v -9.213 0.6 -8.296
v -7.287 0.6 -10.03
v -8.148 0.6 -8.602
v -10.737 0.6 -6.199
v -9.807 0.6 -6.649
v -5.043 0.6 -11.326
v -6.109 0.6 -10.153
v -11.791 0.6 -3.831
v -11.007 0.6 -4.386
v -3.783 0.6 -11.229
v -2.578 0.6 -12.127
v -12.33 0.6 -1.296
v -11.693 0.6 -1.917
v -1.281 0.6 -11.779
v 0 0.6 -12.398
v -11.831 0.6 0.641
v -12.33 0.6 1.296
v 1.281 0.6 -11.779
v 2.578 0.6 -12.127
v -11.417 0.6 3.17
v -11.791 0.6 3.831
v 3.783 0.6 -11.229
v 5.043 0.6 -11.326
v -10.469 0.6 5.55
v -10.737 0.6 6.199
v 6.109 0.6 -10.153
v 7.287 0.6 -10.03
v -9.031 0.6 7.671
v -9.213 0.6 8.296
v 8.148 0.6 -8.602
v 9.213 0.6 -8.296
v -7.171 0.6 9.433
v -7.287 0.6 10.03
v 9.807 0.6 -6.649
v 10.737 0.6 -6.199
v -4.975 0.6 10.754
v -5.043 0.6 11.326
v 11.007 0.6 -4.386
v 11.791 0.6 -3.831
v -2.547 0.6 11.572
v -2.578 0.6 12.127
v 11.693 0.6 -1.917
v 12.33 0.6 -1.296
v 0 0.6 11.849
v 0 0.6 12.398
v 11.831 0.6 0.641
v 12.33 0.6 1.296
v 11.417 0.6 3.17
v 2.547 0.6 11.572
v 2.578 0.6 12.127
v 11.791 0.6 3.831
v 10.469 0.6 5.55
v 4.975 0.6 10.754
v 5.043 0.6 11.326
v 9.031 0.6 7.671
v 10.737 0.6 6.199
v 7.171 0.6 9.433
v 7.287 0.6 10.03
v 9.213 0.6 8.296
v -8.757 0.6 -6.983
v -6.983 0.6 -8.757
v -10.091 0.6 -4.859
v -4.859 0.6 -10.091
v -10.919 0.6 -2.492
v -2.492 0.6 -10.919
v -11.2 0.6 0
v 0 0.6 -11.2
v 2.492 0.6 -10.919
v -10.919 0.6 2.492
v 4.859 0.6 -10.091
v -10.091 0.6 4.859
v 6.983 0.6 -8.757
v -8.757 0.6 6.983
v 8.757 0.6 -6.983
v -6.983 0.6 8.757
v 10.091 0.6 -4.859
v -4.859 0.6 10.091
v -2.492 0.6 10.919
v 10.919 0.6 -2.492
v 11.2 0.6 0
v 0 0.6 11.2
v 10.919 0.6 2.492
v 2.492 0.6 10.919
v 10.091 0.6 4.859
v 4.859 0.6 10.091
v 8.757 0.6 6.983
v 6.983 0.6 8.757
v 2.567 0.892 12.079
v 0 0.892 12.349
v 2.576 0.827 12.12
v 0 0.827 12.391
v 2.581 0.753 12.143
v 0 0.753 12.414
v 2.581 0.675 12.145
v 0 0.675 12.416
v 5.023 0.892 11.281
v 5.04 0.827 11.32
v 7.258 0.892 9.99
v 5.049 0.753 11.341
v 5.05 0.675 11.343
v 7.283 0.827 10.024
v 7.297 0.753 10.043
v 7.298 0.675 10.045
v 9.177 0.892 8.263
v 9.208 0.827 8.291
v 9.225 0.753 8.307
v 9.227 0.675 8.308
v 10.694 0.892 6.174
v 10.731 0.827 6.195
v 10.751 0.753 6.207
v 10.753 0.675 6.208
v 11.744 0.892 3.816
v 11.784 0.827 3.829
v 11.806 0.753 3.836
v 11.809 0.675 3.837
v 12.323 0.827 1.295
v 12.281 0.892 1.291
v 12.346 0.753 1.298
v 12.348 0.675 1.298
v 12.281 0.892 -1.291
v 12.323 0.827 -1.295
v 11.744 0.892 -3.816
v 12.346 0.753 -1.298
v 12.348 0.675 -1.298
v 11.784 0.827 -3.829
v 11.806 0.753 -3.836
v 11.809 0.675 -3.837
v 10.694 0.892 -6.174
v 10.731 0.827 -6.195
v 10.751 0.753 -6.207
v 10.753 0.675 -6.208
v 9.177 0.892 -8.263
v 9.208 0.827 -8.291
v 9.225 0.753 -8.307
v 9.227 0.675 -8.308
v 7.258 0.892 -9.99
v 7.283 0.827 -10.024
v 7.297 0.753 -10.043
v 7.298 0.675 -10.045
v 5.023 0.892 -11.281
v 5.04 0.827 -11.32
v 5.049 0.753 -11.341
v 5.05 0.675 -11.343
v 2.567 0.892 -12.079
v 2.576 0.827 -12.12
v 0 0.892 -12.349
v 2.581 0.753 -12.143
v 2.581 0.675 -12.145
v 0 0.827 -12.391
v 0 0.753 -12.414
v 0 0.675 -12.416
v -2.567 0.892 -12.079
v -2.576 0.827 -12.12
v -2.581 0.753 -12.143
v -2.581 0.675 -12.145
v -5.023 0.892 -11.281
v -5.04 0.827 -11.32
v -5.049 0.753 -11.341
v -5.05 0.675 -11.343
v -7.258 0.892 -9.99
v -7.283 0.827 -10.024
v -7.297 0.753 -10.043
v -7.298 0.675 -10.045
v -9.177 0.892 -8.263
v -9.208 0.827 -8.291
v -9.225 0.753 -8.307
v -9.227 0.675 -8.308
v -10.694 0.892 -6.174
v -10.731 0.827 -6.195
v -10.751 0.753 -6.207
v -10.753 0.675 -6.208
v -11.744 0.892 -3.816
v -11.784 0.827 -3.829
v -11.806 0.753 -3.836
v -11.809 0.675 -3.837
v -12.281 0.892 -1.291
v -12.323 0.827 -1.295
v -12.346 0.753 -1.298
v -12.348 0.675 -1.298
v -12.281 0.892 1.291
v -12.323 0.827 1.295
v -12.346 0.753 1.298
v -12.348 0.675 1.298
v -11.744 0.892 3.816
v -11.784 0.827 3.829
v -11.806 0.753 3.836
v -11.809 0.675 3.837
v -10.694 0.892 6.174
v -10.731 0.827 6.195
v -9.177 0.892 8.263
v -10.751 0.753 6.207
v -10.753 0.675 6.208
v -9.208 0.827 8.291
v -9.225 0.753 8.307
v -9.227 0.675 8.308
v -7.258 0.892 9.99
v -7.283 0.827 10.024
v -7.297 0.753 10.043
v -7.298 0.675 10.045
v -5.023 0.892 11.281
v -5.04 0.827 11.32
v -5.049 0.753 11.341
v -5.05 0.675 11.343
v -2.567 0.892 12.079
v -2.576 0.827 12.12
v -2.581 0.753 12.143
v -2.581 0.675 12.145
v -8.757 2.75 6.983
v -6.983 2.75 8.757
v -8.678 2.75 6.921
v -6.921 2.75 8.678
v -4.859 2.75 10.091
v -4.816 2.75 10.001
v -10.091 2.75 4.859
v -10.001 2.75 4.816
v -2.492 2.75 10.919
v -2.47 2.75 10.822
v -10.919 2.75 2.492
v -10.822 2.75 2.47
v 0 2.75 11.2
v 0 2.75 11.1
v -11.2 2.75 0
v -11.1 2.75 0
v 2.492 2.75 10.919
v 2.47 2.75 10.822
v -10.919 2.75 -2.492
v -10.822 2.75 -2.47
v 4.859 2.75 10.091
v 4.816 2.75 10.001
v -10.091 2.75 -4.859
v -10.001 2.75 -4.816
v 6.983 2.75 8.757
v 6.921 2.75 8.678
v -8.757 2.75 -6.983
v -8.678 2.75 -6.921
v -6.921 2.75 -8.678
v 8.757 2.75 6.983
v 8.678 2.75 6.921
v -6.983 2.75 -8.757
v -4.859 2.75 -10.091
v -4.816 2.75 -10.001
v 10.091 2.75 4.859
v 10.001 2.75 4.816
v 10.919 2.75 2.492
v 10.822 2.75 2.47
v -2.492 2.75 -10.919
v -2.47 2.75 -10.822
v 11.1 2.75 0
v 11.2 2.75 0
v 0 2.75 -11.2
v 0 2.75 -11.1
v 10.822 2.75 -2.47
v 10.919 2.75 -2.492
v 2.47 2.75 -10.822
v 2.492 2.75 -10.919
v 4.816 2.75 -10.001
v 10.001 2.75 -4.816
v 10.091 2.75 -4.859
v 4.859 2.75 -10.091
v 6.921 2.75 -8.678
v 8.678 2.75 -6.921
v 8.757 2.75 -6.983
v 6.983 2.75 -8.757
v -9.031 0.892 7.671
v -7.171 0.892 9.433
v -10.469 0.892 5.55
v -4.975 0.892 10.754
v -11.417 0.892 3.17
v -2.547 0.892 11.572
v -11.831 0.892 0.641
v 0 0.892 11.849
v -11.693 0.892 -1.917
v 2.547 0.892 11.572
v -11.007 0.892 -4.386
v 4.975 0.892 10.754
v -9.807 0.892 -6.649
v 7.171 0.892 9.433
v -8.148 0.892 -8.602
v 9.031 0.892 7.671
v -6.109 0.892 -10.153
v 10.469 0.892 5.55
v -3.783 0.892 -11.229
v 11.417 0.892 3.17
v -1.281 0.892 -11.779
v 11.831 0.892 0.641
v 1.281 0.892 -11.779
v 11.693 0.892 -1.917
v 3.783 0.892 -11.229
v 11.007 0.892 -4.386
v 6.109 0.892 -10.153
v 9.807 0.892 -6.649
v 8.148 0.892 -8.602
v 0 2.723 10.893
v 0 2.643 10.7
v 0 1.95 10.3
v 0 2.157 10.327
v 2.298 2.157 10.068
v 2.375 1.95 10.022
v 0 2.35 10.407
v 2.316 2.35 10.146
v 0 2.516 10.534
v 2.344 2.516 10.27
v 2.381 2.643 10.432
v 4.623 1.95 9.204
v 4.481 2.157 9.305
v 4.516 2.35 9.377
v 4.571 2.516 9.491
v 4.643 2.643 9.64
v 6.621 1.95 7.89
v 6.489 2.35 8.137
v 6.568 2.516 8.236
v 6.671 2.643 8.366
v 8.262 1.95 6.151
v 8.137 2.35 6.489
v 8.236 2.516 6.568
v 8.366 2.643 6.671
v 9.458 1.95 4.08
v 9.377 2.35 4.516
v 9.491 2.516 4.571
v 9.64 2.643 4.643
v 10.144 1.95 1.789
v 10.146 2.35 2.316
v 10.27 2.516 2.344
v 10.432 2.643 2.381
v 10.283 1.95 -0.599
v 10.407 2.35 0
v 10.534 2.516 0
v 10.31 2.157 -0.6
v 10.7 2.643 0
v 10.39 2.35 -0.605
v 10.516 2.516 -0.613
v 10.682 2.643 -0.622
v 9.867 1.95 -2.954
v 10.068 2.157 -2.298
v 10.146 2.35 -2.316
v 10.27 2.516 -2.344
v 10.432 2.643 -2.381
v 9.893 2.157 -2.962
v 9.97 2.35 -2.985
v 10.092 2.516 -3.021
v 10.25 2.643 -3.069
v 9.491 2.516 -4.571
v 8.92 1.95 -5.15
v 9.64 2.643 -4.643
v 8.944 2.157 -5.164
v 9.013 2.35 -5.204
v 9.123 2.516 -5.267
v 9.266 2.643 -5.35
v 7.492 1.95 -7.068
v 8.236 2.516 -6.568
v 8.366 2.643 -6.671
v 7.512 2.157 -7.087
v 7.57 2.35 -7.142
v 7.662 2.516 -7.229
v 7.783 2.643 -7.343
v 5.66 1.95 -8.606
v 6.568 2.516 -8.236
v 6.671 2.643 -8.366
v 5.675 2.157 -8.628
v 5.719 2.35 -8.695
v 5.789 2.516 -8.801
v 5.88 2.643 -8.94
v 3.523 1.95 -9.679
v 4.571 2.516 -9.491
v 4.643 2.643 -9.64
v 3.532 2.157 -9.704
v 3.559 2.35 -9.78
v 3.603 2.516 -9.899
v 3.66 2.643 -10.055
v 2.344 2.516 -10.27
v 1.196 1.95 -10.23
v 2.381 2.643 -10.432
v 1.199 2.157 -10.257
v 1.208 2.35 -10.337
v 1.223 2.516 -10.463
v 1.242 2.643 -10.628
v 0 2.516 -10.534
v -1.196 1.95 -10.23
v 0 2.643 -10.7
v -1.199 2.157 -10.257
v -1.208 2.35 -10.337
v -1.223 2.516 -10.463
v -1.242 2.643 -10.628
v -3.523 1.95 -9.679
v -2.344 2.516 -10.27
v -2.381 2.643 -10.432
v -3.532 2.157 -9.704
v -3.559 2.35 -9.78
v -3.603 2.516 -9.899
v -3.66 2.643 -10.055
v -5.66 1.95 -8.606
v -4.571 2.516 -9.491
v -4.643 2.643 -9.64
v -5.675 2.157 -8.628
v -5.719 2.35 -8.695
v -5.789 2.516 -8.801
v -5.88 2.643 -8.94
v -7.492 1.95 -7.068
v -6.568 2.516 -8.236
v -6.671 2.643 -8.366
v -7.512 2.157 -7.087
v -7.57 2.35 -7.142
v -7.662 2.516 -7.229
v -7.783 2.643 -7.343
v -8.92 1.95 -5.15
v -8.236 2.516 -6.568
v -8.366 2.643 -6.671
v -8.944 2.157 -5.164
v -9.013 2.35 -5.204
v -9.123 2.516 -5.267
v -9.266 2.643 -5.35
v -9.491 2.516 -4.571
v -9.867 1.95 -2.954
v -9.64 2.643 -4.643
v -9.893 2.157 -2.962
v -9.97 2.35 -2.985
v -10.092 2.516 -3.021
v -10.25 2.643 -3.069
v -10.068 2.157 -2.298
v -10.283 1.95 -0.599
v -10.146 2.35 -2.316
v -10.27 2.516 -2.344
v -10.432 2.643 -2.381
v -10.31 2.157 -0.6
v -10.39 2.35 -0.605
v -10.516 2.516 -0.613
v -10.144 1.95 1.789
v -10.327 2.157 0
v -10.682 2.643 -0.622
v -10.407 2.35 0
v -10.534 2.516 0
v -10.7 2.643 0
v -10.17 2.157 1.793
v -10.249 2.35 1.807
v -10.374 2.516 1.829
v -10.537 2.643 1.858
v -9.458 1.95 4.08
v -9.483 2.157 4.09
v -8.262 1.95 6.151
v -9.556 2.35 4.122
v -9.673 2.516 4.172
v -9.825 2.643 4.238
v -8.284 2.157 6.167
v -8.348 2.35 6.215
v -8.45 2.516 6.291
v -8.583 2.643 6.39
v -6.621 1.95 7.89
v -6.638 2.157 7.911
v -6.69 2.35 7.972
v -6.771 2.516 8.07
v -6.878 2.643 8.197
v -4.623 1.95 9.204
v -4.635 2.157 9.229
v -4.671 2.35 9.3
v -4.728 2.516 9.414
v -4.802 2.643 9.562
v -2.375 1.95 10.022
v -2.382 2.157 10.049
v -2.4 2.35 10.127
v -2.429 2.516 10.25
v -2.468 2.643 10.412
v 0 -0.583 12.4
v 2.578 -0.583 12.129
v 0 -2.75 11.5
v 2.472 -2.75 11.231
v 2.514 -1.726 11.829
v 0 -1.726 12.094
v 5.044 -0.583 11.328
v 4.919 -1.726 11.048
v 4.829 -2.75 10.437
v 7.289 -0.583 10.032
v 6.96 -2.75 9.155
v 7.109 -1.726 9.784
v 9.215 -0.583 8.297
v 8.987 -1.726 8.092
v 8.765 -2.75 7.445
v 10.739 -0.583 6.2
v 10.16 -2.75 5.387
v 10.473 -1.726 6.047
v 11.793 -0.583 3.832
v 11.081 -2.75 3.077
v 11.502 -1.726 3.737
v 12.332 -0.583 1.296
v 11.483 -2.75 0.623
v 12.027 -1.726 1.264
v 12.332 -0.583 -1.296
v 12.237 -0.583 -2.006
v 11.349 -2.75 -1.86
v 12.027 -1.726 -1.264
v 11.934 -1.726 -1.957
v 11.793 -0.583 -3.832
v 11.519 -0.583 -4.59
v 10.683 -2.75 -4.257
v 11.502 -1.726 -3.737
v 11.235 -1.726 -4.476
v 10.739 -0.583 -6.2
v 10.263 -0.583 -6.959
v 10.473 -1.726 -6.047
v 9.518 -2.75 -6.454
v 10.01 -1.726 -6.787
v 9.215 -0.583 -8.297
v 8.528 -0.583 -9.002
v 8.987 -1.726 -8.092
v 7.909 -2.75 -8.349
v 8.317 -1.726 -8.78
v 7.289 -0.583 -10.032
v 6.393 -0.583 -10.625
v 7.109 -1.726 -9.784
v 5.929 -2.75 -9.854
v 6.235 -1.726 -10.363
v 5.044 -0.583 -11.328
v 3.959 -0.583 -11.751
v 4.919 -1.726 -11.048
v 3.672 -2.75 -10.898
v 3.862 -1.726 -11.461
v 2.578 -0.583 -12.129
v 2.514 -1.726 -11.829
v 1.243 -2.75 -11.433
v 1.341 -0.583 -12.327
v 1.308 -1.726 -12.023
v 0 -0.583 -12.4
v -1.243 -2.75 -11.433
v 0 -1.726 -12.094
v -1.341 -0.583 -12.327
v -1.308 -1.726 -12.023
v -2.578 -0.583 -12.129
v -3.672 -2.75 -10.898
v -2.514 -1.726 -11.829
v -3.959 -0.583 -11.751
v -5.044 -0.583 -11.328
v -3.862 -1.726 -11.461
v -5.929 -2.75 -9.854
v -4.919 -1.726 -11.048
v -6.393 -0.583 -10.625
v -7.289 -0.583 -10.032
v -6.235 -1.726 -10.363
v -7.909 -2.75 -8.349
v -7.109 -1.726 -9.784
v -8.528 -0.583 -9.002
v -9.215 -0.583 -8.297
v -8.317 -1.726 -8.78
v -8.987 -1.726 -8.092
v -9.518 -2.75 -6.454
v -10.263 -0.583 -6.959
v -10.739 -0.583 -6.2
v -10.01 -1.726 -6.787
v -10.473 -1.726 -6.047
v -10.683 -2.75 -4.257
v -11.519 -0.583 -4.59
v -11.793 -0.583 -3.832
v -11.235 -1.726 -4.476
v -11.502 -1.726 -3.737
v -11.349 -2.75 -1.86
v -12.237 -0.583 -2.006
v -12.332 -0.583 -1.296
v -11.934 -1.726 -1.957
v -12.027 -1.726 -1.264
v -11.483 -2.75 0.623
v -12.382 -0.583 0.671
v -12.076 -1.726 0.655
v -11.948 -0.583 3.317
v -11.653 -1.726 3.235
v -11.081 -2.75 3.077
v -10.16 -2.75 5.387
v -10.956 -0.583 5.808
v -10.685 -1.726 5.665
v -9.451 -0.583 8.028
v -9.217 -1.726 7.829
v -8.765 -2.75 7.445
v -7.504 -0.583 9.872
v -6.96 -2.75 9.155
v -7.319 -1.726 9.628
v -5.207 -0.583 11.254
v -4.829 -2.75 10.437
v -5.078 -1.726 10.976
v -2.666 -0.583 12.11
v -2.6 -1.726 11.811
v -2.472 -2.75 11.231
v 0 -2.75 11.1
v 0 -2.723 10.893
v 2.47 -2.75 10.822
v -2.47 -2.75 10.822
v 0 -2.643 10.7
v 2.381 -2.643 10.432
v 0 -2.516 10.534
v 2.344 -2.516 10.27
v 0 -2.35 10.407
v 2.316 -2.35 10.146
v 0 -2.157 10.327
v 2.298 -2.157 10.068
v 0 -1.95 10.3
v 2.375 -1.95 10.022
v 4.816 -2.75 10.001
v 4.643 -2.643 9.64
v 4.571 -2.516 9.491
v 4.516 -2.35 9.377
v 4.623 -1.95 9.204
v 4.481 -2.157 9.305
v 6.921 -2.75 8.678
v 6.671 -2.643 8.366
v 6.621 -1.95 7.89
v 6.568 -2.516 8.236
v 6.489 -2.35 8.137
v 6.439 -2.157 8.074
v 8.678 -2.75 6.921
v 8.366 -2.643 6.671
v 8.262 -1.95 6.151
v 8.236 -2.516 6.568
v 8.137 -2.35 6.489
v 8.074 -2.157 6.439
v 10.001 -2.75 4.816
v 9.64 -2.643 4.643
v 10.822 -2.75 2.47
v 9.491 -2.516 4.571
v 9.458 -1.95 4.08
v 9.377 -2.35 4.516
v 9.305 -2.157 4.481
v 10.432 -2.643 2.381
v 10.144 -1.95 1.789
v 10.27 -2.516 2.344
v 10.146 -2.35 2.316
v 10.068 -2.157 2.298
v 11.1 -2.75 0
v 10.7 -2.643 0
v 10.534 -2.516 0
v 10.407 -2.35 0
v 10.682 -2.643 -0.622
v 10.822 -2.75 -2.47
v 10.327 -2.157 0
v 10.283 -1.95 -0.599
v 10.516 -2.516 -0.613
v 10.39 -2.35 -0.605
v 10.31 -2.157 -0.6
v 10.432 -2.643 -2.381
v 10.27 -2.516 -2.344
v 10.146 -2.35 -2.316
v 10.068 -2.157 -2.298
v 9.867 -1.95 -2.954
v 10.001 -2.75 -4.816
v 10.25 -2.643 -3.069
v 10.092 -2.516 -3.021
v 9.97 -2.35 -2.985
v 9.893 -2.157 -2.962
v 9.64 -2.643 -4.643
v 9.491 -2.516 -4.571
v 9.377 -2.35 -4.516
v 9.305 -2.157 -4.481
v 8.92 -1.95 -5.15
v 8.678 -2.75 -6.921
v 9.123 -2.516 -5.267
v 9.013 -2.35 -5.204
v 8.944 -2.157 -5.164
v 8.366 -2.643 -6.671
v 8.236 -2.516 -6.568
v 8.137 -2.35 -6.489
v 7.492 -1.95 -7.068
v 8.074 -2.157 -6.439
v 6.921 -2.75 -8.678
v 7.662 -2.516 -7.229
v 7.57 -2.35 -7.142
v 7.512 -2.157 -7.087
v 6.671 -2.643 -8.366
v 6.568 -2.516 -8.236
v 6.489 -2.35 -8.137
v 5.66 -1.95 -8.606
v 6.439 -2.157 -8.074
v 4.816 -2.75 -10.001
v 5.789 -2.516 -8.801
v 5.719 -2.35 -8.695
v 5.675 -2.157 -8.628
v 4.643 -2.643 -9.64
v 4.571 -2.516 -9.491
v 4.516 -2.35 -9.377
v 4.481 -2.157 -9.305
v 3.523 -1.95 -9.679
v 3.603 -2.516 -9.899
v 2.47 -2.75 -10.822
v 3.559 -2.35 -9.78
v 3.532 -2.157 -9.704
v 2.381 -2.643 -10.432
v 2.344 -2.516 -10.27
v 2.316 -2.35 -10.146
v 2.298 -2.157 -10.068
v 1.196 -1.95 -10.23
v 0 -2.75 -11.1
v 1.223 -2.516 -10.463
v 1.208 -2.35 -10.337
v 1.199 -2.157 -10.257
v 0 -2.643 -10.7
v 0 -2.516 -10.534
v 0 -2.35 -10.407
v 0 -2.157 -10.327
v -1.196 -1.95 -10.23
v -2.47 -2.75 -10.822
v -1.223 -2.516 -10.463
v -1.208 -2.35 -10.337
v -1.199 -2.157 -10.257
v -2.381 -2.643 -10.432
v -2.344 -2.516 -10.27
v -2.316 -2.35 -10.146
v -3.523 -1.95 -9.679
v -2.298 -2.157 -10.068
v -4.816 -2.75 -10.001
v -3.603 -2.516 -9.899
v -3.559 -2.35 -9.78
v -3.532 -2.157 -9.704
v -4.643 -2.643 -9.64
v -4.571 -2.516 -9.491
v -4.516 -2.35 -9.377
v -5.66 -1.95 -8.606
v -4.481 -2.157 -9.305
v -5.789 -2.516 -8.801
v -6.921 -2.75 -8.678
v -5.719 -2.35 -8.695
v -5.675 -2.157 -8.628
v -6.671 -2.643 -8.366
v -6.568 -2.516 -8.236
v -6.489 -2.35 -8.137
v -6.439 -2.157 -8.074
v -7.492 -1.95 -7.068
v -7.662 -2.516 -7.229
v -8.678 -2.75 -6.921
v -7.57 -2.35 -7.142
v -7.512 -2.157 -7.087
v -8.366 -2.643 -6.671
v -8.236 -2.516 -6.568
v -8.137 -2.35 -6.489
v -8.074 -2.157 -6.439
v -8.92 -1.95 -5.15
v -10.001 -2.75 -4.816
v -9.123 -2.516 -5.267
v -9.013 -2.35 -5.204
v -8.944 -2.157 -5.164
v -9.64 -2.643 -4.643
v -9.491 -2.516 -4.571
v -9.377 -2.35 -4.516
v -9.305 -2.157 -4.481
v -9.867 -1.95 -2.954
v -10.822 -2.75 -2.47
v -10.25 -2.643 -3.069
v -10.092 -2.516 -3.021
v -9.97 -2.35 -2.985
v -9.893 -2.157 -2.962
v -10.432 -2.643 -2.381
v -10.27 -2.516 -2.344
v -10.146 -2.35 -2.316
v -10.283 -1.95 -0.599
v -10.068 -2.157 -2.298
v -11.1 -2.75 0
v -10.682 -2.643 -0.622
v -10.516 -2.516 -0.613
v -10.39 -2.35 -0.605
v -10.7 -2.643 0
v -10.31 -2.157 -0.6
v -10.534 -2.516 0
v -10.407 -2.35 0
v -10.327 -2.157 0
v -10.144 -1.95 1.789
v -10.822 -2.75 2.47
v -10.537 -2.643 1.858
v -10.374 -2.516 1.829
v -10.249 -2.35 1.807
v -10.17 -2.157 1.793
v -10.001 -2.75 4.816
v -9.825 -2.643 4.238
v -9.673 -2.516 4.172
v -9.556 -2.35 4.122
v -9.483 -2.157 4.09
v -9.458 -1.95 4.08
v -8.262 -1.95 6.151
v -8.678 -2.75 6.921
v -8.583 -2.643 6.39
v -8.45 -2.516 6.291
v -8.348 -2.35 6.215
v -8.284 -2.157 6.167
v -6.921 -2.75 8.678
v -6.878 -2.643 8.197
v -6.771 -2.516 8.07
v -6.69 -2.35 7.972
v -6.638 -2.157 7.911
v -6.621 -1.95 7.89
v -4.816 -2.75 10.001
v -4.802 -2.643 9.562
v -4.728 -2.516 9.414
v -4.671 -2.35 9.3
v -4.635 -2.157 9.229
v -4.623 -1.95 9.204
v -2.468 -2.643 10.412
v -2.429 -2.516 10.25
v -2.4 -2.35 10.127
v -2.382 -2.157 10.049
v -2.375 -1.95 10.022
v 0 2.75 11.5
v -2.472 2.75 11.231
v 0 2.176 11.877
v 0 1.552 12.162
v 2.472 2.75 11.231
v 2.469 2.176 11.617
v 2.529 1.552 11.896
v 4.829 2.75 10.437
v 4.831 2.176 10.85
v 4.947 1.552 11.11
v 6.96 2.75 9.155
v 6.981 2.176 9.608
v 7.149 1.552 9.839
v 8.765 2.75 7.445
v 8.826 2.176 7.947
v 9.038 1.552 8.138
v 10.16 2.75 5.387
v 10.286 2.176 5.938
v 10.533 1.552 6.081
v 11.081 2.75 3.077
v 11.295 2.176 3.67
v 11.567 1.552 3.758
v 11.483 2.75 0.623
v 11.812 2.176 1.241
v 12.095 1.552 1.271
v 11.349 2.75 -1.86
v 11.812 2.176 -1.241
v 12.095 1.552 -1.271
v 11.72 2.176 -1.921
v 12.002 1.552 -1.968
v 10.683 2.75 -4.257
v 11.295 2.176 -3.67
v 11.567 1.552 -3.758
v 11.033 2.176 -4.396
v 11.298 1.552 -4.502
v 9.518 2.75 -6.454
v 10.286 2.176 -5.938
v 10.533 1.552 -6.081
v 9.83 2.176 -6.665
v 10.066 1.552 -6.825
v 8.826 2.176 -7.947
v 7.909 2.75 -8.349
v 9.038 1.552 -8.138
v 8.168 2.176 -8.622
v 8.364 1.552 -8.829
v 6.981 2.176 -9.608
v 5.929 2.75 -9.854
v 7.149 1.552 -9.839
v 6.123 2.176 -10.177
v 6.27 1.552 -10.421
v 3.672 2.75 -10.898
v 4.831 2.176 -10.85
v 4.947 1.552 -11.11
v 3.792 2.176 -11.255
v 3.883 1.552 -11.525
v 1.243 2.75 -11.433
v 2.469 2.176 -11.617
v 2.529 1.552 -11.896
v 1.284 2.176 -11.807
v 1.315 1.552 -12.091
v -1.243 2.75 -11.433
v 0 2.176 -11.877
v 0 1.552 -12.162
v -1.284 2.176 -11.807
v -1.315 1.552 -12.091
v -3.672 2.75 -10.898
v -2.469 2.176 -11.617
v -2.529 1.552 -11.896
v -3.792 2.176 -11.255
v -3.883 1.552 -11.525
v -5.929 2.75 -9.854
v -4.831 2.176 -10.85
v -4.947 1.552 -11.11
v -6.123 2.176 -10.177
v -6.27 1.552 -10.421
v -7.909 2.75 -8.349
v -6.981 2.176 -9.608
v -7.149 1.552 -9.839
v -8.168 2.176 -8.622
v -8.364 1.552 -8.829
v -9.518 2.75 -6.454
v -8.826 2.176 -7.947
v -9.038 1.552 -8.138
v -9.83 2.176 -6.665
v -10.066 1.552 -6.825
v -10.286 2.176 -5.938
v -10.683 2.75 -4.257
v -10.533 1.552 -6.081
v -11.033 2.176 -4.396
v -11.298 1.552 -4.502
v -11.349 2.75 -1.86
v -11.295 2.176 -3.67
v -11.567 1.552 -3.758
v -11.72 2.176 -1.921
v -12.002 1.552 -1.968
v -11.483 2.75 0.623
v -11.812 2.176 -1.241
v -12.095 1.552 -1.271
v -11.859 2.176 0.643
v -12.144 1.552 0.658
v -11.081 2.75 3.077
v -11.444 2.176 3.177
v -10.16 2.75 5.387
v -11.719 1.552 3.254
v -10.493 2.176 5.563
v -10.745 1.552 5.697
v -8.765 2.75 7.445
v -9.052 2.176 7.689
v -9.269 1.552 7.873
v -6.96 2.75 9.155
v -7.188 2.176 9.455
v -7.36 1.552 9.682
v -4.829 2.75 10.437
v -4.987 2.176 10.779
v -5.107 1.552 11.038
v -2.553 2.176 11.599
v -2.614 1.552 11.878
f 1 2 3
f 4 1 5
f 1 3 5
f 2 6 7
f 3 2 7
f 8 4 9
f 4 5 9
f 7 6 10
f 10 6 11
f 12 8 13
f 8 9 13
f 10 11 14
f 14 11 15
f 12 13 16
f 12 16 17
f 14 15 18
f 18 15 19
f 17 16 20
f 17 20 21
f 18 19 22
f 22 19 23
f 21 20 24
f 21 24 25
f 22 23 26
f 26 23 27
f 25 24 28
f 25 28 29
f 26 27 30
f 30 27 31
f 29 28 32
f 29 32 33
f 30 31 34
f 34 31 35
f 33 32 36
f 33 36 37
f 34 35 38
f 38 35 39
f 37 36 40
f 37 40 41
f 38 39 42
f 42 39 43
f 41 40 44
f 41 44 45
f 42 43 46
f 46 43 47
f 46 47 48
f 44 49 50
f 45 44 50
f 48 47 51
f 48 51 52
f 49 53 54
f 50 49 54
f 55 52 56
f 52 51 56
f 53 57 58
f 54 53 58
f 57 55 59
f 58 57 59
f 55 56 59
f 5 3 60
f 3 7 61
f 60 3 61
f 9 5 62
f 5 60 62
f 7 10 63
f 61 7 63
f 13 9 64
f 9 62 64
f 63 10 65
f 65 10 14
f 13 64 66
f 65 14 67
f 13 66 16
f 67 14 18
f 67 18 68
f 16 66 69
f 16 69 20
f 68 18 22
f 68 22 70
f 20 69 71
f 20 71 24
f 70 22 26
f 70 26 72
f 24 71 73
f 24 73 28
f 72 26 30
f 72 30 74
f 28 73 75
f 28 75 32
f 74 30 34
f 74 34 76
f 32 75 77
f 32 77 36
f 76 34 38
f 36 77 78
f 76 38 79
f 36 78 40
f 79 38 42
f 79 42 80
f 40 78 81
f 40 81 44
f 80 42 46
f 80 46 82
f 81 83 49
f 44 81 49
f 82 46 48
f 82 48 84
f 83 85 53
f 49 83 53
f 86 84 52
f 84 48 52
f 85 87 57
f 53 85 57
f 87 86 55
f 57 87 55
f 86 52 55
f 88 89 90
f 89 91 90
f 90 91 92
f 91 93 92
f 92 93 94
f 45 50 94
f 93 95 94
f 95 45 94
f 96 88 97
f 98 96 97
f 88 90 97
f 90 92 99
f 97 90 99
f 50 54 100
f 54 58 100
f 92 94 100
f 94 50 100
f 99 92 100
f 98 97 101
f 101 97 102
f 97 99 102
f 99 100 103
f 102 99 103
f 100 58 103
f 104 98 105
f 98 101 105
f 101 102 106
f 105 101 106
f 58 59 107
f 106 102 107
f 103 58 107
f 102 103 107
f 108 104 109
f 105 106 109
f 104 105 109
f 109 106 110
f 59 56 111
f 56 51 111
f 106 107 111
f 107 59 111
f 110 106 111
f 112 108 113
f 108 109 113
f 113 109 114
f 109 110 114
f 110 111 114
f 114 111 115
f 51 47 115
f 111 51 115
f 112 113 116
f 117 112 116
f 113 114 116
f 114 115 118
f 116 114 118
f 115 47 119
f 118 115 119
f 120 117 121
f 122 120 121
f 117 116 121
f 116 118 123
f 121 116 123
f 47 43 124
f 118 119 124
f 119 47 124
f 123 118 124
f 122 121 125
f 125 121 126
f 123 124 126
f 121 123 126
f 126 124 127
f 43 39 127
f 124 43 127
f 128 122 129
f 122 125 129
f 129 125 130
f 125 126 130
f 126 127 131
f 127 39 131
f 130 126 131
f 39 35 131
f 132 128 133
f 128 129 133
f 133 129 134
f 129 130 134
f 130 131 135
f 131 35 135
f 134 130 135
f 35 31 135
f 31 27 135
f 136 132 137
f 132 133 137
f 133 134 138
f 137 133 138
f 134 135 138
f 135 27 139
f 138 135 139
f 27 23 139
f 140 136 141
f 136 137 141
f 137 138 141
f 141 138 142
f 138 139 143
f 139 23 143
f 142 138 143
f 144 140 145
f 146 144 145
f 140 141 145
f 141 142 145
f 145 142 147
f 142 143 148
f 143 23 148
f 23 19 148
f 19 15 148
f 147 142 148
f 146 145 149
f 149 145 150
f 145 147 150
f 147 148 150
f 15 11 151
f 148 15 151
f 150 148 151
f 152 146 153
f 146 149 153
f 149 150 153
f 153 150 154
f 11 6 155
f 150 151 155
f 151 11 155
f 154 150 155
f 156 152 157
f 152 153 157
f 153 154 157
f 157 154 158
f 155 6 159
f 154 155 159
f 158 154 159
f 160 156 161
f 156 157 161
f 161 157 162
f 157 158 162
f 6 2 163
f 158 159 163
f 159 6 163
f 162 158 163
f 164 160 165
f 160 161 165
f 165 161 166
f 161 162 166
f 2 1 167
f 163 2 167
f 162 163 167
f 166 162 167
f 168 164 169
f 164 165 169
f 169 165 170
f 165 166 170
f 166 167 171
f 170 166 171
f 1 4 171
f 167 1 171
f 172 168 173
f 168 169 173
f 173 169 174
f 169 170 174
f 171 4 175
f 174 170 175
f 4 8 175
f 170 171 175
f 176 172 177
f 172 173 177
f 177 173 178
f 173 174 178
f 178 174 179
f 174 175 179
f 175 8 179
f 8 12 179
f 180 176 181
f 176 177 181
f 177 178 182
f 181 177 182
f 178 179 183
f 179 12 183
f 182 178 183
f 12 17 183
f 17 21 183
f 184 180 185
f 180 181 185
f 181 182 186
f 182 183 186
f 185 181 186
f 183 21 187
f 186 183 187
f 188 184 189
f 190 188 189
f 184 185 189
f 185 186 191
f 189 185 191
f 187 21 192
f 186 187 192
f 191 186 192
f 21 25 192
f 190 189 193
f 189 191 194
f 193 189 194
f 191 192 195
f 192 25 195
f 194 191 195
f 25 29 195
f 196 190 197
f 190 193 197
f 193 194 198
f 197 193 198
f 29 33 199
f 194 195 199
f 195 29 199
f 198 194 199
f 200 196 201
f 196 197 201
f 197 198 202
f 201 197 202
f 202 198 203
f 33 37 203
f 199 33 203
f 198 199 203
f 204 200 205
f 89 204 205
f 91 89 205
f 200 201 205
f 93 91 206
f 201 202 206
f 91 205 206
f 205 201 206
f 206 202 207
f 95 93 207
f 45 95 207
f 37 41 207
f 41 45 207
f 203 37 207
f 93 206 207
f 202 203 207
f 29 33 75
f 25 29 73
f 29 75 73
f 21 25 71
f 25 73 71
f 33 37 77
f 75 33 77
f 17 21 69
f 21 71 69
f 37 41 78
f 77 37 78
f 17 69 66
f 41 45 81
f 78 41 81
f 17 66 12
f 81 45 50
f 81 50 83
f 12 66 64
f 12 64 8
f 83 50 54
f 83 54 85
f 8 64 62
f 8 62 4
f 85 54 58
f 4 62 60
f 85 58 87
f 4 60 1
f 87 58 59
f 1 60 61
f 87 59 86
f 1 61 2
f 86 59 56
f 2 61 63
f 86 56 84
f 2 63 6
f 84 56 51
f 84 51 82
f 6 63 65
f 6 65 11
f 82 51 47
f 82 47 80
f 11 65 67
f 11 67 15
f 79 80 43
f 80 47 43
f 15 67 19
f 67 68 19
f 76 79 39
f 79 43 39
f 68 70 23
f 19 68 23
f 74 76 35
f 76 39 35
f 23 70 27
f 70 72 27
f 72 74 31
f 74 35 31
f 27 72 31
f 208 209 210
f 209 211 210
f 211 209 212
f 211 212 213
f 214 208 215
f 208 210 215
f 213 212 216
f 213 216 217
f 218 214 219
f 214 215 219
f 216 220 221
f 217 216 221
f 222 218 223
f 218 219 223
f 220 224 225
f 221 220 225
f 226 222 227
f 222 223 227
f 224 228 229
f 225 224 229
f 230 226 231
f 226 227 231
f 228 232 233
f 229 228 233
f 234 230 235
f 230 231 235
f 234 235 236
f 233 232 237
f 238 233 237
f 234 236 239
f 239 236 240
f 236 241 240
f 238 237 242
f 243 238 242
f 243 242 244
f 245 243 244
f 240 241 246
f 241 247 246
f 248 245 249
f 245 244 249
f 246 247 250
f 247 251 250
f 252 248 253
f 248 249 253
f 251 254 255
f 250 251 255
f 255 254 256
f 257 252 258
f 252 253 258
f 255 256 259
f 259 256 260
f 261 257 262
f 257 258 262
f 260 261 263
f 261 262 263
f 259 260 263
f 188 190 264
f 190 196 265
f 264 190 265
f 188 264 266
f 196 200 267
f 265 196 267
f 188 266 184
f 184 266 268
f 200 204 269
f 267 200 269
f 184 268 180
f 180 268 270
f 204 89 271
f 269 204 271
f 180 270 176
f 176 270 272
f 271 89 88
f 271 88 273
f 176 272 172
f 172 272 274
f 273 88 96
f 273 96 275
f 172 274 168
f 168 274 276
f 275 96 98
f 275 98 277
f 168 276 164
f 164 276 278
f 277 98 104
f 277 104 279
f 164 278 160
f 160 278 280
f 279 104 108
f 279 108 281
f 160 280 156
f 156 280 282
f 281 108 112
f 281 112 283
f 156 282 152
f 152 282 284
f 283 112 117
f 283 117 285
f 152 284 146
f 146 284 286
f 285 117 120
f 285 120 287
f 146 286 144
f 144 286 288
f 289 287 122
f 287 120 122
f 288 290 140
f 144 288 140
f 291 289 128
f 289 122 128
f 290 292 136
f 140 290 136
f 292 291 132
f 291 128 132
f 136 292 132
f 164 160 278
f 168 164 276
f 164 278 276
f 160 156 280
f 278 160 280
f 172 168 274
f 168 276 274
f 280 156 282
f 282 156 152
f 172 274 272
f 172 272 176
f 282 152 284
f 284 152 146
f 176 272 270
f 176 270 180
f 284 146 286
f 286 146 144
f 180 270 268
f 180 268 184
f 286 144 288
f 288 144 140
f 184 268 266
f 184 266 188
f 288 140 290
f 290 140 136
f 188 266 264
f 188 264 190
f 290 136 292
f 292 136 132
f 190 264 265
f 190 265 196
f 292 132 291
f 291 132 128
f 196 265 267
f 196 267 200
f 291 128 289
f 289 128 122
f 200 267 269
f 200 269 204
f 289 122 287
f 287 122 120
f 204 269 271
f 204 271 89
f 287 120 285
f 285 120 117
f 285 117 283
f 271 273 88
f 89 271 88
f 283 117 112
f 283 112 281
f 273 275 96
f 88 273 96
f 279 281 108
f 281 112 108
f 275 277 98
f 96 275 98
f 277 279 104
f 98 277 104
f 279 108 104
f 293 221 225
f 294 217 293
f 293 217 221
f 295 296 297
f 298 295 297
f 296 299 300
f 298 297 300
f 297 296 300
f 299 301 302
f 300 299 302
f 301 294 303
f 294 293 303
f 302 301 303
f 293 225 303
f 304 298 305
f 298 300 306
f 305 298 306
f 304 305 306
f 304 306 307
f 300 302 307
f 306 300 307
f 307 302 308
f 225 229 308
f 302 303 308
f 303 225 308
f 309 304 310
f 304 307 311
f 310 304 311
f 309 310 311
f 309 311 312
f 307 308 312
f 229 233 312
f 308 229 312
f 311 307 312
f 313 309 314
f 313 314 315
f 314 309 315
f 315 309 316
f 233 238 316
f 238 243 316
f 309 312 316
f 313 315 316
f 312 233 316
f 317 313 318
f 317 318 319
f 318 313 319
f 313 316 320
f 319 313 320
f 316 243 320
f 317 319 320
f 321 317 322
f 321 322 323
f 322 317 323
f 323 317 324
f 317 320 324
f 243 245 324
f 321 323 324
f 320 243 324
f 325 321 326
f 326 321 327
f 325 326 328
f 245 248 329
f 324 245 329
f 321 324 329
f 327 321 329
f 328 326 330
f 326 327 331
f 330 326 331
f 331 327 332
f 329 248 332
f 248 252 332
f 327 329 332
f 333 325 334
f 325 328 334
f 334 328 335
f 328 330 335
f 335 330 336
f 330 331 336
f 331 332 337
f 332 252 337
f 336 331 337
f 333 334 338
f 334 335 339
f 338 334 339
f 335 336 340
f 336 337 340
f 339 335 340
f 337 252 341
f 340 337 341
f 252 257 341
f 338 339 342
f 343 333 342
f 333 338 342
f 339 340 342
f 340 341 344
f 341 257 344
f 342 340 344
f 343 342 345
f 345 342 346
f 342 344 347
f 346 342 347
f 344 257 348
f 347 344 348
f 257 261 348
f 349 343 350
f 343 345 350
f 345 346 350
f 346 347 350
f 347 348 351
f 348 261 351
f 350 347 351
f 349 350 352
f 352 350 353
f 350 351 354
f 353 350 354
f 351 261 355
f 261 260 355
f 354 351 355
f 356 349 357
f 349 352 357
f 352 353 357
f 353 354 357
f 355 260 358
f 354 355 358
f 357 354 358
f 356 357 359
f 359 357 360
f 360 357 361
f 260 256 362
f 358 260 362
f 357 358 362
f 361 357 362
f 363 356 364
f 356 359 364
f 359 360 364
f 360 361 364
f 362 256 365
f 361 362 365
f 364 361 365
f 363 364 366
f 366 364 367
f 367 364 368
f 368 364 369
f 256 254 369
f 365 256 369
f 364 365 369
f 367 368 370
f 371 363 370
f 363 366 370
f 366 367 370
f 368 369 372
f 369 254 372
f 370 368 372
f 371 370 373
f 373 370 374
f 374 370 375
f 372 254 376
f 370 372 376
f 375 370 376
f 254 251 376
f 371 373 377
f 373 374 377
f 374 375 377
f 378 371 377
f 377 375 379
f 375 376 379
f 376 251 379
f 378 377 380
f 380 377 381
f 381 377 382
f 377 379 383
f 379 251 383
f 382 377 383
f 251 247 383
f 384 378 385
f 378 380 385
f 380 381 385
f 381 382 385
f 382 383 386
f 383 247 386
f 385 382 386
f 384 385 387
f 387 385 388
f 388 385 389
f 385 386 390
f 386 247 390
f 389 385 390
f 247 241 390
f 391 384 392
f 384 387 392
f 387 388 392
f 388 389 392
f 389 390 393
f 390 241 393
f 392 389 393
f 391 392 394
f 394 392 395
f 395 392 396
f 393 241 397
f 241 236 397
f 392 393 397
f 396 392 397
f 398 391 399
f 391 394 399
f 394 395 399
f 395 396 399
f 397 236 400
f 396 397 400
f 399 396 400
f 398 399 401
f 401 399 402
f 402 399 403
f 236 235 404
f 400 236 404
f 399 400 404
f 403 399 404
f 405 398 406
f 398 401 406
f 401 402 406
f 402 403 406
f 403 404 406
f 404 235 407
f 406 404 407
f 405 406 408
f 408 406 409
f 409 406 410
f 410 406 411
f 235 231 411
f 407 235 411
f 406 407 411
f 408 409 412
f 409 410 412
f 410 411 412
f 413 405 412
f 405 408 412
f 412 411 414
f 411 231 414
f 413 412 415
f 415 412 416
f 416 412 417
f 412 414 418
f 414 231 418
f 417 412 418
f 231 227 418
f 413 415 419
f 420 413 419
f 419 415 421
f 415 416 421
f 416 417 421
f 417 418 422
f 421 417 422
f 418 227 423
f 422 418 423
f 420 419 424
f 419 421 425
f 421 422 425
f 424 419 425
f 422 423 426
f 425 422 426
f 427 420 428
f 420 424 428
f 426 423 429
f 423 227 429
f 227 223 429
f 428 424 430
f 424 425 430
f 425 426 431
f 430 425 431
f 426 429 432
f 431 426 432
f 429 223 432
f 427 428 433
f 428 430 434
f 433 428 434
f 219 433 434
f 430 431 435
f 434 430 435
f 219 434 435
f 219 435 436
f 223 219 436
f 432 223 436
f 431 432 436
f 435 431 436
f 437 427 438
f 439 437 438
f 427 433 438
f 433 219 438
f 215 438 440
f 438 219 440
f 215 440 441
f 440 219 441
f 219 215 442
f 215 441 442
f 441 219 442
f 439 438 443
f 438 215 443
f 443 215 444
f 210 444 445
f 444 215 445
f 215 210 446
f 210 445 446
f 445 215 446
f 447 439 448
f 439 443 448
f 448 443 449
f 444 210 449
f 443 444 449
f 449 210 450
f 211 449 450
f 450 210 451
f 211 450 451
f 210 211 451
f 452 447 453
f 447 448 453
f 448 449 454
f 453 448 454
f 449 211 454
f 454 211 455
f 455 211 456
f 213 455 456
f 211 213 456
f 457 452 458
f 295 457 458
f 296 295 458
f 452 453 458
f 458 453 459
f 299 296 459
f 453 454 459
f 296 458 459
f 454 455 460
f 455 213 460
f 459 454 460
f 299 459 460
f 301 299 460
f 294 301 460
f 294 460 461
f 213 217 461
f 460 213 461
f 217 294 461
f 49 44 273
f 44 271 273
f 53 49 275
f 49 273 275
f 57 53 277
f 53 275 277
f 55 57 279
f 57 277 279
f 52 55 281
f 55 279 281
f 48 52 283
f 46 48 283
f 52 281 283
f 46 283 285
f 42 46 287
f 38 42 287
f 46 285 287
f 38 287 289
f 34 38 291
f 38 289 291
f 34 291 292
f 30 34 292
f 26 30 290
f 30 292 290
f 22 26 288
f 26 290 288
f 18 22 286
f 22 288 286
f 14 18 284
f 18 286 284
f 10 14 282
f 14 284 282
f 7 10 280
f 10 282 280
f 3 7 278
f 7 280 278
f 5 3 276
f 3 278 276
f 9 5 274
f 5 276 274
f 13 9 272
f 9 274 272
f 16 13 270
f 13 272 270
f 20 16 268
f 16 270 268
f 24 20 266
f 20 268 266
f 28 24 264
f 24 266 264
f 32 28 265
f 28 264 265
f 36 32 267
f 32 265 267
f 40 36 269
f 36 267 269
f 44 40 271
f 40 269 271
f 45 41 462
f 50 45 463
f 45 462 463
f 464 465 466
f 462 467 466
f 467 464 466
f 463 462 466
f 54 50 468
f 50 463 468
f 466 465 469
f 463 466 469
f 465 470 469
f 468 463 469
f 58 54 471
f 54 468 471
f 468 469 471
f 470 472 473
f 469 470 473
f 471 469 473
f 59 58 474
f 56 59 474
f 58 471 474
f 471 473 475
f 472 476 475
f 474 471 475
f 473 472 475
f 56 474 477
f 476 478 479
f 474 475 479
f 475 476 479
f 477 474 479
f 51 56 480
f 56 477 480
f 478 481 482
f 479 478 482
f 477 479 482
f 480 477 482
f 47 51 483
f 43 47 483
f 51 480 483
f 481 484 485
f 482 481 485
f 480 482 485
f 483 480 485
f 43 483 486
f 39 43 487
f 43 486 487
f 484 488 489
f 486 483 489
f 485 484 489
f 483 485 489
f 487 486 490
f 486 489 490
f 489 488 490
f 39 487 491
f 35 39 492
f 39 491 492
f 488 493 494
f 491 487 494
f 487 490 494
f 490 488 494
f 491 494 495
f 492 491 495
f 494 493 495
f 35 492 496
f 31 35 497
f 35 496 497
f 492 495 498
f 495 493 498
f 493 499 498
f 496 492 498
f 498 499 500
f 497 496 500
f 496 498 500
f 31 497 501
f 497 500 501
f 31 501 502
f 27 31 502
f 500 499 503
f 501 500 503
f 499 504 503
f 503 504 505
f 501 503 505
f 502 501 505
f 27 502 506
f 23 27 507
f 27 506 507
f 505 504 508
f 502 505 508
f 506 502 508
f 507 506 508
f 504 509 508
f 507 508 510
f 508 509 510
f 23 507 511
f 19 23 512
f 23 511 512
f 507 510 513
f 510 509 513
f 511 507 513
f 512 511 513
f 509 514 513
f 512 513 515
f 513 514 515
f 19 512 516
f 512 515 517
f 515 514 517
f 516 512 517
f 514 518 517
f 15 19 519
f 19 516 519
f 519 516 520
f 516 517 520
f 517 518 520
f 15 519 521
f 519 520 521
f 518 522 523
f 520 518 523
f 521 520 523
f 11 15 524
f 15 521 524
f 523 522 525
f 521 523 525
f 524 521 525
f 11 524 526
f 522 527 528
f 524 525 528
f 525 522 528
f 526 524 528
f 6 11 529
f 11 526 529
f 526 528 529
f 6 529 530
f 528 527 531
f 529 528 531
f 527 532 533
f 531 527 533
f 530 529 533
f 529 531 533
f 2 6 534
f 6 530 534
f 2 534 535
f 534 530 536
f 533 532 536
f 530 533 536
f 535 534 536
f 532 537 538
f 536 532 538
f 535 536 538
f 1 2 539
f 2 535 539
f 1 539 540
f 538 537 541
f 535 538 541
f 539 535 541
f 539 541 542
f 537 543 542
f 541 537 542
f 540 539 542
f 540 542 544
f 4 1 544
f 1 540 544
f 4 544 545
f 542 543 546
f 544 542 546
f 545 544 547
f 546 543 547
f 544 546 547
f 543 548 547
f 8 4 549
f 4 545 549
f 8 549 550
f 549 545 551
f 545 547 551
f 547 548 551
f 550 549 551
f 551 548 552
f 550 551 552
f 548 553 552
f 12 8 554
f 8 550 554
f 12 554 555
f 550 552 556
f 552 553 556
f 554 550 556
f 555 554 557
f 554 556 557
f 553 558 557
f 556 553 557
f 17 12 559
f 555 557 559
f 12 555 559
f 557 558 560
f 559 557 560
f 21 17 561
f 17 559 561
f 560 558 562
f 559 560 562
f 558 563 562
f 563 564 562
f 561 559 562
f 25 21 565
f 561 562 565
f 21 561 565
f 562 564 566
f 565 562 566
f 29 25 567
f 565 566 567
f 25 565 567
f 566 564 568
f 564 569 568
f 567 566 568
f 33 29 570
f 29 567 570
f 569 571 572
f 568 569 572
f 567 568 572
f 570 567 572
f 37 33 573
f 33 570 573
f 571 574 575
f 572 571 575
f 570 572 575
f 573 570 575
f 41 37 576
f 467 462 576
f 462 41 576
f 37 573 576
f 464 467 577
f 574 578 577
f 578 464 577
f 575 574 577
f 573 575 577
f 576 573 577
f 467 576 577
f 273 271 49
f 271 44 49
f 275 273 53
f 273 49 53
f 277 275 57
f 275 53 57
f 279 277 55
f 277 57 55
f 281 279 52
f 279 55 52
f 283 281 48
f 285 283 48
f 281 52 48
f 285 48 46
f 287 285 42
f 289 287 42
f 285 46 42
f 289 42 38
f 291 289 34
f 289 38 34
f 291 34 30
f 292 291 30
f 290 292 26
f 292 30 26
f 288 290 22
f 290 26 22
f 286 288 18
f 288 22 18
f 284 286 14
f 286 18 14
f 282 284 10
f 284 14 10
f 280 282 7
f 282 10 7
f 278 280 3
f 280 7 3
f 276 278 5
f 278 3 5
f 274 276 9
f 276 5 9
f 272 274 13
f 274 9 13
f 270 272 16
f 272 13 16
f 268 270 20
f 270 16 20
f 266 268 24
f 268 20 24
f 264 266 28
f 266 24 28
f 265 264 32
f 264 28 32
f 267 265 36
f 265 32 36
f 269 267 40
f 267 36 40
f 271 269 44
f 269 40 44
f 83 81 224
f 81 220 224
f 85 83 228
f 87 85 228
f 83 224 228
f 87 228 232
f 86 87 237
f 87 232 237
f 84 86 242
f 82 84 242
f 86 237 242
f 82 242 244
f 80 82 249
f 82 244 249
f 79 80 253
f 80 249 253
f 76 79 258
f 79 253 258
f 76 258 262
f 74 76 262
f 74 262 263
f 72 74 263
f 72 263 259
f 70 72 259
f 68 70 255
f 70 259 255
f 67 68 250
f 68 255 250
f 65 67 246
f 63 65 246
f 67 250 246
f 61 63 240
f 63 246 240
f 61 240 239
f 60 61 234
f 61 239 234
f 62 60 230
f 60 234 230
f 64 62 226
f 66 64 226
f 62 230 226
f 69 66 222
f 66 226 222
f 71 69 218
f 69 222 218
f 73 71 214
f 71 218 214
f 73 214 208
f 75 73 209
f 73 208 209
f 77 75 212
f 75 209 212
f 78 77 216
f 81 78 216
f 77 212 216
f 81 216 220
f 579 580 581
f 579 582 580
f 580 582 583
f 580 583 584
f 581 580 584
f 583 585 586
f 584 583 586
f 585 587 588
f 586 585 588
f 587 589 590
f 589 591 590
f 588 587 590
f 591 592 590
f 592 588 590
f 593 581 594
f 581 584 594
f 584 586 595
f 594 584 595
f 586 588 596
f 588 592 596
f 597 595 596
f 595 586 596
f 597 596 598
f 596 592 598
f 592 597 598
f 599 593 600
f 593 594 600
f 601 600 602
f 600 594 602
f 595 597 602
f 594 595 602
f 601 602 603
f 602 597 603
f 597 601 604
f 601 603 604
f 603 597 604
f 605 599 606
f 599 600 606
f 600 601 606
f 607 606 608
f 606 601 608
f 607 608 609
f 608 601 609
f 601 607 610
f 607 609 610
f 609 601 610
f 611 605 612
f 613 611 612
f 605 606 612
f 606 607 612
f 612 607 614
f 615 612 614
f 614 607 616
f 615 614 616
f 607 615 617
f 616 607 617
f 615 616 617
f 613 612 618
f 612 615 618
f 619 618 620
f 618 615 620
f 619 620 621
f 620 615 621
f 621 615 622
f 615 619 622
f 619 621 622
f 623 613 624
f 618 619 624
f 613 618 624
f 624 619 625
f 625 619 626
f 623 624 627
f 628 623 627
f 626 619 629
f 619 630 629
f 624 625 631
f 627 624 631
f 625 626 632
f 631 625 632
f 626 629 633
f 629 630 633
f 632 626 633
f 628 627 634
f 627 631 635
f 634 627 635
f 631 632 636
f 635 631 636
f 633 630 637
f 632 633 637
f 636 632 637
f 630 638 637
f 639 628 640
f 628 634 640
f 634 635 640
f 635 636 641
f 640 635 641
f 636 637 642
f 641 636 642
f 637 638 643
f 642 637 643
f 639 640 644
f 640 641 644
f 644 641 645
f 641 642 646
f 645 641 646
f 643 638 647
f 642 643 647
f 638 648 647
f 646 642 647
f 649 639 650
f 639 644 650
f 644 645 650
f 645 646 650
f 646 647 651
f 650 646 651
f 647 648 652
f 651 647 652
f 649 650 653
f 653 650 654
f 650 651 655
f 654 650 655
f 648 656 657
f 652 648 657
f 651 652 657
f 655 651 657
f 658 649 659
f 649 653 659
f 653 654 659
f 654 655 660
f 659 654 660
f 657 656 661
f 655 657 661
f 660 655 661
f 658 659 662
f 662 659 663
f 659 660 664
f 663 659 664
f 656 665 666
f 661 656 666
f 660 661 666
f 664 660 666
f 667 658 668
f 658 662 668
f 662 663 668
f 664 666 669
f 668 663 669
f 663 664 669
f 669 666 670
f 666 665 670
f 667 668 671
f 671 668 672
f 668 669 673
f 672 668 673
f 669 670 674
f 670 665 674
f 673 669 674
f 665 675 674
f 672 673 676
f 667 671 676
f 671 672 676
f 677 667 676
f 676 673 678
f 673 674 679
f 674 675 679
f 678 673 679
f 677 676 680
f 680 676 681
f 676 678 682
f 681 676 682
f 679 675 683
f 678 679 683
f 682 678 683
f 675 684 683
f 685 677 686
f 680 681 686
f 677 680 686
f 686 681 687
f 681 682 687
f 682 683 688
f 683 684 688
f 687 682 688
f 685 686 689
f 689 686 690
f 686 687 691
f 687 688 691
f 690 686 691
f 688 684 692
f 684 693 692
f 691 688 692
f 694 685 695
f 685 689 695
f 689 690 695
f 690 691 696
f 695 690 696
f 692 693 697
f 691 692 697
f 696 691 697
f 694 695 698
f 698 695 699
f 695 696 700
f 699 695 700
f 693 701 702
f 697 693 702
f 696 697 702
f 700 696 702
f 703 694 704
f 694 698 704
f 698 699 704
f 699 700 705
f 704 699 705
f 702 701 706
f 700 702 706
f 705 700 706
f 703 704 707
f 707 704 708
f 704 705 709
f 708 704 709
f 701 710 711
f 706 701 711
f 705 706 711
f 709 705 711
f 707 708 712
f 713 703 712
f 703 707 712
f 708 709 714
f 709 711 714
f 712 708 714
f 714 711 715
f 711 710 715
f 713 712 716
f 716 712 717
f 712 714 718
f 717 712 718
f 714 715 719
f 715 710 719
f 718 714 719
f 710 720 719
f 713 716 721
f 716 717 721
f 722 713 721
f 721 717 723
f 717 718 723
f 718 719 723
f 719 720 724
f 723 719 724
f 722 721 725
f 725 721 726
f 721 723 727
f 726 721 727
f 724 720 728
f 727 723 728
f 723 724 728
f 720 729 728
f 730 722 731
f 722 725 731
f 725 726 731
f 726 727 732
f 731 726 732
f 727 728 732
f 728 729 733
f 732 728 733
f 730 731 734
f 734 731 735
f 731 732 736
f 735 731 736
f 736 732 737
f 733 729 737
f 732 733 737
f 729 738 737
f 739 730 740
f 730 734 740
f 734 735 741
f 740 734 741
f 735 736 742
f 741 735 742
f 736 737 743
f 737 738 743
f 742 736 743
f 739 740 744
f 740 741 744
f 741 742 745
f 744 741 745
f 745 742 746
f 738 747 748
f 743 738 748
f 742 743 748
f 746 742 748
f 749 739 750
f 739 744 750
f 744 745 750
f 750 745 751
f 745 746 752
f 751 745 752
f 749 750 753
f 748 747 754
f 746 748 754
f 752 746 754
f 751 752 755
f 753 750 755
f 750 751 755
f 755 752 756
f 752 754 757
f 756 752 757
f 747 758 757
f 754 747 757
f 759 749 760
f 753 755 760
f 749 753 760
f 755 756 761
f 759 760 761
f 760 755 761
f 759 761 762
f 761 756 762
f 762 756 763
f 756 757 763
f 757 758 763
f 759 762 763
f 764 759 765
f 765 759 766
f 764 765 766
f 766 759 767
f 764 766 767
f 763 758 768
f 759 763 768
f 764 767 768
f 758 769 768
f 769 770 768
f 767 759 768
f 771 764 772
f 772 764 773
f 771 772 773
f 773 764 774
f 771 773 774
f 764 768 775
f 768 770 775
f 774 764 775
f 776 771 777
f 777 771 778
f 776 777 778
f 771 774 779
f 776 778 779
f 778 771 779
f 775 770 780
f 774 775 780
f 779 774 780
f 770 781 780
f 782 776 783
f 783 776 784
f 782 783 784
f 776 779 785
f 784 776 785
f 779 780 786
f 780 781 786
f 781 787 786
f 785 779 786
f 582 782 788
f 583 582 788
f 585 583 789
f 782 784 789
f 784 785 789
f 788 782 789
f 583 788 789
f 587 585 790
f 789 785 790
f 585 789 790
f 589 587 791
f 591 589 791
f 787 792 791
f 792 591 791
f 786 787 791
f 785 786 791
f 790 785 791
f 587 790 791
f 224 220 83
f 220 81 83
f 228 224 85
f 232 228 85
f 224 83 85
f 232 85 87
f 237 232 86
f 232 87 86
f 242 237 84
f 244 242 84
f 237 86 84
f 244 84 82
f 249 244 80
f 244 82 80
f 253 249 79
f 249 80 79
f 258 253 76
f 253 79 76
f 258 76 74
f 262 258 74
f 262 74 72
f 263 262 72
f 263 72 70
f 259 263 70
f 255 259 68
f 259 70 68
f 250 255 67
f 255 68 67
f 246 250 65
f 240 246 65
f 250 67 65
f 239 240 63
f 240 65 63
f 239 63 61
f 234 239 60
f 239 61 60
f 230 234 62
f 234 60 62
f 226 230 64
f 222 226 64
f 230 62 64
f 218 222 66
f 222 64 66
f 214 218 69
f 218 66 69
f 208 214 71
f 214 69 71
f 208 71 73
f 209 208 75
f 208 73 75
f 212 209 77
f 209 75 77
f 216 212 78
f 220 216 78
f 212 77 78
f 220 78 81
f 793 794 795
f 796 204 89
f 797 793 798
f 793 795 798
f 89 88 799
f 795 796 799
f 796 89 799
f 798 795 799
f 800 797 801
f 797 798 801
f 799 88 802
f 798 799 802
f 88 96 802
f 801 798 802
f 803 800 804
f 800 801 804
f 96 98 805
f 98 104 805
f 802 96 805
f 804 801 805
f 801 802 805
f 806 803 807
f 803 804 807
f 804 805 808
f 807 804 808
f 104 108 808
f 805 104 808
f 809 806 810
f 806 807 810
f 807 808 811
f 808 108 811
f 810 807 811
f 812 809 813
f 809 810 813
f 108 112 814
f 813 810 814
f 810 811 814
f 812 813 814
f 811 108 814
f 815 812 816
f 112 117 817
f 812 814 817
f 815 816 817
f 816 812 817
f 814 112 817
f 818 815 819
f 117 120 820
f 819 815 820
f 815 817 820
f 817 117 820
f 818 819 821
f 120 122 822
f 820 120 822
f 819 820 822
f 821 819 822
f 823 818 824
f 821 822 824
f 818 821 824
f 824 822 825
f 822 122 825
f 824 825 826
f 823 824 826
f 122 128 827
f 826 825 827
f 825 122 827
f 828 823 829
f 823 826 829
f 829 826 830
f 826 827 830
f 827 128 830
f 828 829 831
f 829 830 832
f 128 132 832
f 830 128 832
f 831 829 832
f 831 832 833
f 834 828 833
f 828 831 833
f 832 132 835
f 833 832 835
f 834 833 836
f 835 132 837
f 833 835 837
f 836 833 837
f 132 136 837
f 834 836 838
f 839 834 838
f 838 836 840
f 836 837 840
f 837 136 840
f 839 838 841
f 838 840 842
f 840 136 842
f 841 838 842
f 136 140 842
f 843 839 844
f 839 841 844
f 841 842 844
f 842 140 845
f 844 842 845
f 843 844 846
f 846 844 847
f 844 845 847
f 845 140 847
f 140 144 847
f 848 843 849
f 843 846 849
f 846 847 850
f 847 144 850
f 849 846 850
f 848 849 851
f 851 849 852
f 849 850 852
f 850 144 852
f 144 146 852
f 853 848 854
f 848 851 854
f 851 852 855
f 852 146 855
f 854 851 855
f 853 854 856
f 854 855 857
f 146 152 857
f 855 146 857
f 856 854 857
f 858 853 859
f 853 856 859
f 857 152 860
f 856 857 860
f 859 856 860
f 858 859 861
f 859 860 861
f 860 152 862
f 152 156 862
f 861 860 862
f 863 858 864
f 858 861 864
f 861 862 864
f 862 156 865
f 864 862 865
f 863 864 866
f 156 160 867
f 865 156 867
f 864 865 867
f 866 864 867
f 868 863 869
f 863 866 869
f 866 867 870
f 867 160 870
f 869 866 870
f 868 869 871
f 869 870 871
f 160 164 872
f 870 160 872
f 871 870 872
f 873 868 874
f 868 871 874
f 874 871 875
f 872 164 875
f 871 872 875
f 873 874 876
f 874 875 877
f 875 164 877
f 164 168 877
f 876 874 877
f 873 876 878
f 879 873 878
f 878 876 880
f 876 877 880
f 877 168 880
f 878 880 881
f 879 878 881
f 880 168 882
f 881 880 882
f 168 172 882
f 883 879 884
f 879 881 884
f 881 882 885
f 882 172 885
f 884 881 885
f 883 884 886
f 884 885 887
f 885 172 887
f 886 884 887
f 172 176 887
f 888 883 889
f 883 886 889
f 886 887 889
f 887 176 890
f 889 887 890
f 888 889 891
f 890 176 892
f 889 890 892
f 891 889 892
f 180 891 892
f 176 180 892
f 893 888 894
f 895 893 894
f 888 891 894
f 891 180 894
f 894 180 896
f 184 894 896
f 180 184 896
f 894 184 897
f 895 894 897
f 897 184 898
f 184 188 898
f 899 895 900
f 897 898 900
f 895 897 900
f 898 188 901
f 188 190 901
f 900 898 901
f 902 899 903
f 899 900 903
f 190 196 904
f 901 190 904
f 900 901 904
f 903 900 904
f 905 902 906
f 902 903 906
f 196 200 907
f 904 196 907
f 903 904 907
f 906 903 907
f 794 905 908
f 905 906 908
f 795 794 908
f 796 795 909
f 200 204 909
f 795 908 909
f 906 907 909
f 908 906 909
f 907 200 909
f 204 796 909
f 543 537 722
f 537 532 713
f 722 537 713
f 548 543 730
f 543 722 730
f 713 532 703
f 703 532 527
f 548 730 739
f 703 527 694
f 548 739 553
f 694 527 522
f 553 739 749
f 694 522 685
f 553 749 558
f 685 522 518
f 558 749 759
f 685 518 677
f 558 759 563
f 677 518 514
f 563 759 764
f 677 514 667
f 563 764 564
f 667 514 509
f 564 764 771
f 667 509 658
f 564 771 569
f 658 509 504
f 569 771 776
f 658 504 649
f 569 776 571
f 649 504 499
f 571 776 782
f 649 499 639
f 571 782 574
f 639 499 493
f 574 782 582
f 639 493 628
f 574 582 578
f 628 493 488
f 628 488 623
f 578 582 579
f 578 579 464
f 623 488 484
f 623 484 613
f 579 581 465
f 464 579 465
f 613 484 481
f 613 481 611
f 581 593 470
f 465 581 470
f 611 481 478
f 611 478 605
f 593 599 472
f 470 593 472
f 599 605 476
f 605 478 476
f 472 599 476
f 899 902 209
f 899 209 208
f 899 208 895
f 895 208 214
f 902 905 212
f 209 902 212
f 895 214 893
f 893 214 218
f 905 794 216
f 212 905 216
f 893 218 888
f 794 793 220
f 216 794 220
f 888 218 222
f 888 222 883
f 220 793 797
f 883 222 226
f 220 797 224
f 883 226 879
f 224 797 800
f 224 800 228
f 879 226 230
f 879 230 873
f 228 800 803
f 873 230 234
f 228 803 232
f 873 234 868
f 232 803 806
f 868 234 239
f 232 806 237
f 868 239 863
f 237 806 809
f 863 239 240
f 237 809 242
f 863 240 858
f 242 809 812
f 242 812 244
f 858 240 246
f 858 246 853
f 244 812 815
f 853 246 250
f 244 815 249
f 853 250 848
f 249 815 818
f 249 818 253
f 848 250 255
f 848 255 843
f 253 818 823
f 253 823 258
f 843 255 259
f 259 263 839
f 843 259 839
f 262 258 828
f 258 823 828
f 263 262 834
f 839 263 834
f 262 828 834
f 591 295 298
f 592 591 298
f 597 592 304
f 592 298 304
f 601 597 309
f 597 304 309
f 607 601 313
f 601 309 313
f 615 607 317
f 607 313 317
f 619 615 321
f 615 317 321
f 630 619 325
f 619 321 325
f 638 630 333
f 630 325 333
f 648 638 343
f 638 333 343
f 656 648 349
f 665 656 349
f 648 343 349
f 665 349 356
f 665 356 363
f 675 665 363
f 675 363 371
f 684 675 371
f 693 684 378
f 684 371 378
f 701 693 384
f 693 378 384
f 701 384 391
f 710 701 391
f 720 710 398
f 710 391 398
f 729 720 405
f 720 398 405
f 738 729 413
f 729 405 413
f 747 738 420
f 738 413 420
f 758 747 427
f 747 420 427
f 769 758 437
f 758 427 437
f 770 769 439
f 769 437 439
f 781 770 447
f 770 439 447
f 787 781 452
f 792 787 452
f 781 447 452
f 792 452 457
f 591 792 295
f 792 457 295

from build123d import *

# Parameters (mm, degrees)
F6_R = 0.8


with BuildPart() as f3:
    # F2 (on Right) → F3 (revolve)
    with BuildSketch(Plane.YZ):
        with BuildLine():
            Line((-2.75, 11.5), (-2.75, 10.3))
            Line((-2.75, 10.3), (2.75, 10.3))
            Line((2.75, 10.3), (2.75, 11.2))
            Line((2.75, 11.2), (0.6, 11.2))
            Line((0.6, 11.2), (0.6, 11.8488059788))
            Line((0.6, 11.8488059788), (0.6, 12.397868912))
            ThreePointArc((0.6, 12.397868912), (-1.1649751696, 12.2846369334), (-2.75, 11.5))
        make_face()
    revolve(axis=Axis((0, 7.8418560492, 0), (0, 1, 0)))

    # F6
    f6_edges = [f3.edges().sort_by_distance(p)[0] for p in [
        (0, -2.75, -10.3),
        (0, 2.75, -10.3),
    ]]
    fillet(f6_edges, radius=F6_R)


with BuildPart() as f4:
    # F2 (on Right) → F4 (revolve)
    with BuildSketch(Plane.YZ):
        with BuildLine():
            Line((0.6, 11.2), (2.75, 11.2))
            Line((2.75, 11.2), (2.75, 11.5))
            ThreePointArc((2.75, 11.5), (1.8696796947, 12.0312497047), (0.8917491749, 12.3488059788))
            Line((0.8917491749, 12.3488059788), (0.8917491749, 11.8488059788))
            Line((0.8917491749, 11.8488059788), (0.6, 11.8488059788))
            Line((0.6, 11.8488059788), (0.6, 11.2))
        make_face()
    revolve(axis=Axis((0, 7.8418560492, 0), (0, 1, 0)))


with BuildPart() as f5:
    # F2 (on Right) → F5 (revolve)
    with BuildSketch(Plane.YZ):
        with BuildLine():
            ThreePointArc((0.8917491749, 12.3488059788), (0.7526960928, 12.4139010323), (0.6, 12.397868912))
            Line((0.6, 12.397868912), (0.6, 11.8488059788))
            Line((0.6, 11.8488059788), (0.8917491749, 11.8488059788))
            Line((0.8917491749, 11.8488059788), (0.8917491749, 12.3488059788))
        make_face()
    revolve(axis=Axis((0, 7.8418560492, 0), (0, 1, 0)))


solid = Compound([f3.part, f4.part, f5.part])
